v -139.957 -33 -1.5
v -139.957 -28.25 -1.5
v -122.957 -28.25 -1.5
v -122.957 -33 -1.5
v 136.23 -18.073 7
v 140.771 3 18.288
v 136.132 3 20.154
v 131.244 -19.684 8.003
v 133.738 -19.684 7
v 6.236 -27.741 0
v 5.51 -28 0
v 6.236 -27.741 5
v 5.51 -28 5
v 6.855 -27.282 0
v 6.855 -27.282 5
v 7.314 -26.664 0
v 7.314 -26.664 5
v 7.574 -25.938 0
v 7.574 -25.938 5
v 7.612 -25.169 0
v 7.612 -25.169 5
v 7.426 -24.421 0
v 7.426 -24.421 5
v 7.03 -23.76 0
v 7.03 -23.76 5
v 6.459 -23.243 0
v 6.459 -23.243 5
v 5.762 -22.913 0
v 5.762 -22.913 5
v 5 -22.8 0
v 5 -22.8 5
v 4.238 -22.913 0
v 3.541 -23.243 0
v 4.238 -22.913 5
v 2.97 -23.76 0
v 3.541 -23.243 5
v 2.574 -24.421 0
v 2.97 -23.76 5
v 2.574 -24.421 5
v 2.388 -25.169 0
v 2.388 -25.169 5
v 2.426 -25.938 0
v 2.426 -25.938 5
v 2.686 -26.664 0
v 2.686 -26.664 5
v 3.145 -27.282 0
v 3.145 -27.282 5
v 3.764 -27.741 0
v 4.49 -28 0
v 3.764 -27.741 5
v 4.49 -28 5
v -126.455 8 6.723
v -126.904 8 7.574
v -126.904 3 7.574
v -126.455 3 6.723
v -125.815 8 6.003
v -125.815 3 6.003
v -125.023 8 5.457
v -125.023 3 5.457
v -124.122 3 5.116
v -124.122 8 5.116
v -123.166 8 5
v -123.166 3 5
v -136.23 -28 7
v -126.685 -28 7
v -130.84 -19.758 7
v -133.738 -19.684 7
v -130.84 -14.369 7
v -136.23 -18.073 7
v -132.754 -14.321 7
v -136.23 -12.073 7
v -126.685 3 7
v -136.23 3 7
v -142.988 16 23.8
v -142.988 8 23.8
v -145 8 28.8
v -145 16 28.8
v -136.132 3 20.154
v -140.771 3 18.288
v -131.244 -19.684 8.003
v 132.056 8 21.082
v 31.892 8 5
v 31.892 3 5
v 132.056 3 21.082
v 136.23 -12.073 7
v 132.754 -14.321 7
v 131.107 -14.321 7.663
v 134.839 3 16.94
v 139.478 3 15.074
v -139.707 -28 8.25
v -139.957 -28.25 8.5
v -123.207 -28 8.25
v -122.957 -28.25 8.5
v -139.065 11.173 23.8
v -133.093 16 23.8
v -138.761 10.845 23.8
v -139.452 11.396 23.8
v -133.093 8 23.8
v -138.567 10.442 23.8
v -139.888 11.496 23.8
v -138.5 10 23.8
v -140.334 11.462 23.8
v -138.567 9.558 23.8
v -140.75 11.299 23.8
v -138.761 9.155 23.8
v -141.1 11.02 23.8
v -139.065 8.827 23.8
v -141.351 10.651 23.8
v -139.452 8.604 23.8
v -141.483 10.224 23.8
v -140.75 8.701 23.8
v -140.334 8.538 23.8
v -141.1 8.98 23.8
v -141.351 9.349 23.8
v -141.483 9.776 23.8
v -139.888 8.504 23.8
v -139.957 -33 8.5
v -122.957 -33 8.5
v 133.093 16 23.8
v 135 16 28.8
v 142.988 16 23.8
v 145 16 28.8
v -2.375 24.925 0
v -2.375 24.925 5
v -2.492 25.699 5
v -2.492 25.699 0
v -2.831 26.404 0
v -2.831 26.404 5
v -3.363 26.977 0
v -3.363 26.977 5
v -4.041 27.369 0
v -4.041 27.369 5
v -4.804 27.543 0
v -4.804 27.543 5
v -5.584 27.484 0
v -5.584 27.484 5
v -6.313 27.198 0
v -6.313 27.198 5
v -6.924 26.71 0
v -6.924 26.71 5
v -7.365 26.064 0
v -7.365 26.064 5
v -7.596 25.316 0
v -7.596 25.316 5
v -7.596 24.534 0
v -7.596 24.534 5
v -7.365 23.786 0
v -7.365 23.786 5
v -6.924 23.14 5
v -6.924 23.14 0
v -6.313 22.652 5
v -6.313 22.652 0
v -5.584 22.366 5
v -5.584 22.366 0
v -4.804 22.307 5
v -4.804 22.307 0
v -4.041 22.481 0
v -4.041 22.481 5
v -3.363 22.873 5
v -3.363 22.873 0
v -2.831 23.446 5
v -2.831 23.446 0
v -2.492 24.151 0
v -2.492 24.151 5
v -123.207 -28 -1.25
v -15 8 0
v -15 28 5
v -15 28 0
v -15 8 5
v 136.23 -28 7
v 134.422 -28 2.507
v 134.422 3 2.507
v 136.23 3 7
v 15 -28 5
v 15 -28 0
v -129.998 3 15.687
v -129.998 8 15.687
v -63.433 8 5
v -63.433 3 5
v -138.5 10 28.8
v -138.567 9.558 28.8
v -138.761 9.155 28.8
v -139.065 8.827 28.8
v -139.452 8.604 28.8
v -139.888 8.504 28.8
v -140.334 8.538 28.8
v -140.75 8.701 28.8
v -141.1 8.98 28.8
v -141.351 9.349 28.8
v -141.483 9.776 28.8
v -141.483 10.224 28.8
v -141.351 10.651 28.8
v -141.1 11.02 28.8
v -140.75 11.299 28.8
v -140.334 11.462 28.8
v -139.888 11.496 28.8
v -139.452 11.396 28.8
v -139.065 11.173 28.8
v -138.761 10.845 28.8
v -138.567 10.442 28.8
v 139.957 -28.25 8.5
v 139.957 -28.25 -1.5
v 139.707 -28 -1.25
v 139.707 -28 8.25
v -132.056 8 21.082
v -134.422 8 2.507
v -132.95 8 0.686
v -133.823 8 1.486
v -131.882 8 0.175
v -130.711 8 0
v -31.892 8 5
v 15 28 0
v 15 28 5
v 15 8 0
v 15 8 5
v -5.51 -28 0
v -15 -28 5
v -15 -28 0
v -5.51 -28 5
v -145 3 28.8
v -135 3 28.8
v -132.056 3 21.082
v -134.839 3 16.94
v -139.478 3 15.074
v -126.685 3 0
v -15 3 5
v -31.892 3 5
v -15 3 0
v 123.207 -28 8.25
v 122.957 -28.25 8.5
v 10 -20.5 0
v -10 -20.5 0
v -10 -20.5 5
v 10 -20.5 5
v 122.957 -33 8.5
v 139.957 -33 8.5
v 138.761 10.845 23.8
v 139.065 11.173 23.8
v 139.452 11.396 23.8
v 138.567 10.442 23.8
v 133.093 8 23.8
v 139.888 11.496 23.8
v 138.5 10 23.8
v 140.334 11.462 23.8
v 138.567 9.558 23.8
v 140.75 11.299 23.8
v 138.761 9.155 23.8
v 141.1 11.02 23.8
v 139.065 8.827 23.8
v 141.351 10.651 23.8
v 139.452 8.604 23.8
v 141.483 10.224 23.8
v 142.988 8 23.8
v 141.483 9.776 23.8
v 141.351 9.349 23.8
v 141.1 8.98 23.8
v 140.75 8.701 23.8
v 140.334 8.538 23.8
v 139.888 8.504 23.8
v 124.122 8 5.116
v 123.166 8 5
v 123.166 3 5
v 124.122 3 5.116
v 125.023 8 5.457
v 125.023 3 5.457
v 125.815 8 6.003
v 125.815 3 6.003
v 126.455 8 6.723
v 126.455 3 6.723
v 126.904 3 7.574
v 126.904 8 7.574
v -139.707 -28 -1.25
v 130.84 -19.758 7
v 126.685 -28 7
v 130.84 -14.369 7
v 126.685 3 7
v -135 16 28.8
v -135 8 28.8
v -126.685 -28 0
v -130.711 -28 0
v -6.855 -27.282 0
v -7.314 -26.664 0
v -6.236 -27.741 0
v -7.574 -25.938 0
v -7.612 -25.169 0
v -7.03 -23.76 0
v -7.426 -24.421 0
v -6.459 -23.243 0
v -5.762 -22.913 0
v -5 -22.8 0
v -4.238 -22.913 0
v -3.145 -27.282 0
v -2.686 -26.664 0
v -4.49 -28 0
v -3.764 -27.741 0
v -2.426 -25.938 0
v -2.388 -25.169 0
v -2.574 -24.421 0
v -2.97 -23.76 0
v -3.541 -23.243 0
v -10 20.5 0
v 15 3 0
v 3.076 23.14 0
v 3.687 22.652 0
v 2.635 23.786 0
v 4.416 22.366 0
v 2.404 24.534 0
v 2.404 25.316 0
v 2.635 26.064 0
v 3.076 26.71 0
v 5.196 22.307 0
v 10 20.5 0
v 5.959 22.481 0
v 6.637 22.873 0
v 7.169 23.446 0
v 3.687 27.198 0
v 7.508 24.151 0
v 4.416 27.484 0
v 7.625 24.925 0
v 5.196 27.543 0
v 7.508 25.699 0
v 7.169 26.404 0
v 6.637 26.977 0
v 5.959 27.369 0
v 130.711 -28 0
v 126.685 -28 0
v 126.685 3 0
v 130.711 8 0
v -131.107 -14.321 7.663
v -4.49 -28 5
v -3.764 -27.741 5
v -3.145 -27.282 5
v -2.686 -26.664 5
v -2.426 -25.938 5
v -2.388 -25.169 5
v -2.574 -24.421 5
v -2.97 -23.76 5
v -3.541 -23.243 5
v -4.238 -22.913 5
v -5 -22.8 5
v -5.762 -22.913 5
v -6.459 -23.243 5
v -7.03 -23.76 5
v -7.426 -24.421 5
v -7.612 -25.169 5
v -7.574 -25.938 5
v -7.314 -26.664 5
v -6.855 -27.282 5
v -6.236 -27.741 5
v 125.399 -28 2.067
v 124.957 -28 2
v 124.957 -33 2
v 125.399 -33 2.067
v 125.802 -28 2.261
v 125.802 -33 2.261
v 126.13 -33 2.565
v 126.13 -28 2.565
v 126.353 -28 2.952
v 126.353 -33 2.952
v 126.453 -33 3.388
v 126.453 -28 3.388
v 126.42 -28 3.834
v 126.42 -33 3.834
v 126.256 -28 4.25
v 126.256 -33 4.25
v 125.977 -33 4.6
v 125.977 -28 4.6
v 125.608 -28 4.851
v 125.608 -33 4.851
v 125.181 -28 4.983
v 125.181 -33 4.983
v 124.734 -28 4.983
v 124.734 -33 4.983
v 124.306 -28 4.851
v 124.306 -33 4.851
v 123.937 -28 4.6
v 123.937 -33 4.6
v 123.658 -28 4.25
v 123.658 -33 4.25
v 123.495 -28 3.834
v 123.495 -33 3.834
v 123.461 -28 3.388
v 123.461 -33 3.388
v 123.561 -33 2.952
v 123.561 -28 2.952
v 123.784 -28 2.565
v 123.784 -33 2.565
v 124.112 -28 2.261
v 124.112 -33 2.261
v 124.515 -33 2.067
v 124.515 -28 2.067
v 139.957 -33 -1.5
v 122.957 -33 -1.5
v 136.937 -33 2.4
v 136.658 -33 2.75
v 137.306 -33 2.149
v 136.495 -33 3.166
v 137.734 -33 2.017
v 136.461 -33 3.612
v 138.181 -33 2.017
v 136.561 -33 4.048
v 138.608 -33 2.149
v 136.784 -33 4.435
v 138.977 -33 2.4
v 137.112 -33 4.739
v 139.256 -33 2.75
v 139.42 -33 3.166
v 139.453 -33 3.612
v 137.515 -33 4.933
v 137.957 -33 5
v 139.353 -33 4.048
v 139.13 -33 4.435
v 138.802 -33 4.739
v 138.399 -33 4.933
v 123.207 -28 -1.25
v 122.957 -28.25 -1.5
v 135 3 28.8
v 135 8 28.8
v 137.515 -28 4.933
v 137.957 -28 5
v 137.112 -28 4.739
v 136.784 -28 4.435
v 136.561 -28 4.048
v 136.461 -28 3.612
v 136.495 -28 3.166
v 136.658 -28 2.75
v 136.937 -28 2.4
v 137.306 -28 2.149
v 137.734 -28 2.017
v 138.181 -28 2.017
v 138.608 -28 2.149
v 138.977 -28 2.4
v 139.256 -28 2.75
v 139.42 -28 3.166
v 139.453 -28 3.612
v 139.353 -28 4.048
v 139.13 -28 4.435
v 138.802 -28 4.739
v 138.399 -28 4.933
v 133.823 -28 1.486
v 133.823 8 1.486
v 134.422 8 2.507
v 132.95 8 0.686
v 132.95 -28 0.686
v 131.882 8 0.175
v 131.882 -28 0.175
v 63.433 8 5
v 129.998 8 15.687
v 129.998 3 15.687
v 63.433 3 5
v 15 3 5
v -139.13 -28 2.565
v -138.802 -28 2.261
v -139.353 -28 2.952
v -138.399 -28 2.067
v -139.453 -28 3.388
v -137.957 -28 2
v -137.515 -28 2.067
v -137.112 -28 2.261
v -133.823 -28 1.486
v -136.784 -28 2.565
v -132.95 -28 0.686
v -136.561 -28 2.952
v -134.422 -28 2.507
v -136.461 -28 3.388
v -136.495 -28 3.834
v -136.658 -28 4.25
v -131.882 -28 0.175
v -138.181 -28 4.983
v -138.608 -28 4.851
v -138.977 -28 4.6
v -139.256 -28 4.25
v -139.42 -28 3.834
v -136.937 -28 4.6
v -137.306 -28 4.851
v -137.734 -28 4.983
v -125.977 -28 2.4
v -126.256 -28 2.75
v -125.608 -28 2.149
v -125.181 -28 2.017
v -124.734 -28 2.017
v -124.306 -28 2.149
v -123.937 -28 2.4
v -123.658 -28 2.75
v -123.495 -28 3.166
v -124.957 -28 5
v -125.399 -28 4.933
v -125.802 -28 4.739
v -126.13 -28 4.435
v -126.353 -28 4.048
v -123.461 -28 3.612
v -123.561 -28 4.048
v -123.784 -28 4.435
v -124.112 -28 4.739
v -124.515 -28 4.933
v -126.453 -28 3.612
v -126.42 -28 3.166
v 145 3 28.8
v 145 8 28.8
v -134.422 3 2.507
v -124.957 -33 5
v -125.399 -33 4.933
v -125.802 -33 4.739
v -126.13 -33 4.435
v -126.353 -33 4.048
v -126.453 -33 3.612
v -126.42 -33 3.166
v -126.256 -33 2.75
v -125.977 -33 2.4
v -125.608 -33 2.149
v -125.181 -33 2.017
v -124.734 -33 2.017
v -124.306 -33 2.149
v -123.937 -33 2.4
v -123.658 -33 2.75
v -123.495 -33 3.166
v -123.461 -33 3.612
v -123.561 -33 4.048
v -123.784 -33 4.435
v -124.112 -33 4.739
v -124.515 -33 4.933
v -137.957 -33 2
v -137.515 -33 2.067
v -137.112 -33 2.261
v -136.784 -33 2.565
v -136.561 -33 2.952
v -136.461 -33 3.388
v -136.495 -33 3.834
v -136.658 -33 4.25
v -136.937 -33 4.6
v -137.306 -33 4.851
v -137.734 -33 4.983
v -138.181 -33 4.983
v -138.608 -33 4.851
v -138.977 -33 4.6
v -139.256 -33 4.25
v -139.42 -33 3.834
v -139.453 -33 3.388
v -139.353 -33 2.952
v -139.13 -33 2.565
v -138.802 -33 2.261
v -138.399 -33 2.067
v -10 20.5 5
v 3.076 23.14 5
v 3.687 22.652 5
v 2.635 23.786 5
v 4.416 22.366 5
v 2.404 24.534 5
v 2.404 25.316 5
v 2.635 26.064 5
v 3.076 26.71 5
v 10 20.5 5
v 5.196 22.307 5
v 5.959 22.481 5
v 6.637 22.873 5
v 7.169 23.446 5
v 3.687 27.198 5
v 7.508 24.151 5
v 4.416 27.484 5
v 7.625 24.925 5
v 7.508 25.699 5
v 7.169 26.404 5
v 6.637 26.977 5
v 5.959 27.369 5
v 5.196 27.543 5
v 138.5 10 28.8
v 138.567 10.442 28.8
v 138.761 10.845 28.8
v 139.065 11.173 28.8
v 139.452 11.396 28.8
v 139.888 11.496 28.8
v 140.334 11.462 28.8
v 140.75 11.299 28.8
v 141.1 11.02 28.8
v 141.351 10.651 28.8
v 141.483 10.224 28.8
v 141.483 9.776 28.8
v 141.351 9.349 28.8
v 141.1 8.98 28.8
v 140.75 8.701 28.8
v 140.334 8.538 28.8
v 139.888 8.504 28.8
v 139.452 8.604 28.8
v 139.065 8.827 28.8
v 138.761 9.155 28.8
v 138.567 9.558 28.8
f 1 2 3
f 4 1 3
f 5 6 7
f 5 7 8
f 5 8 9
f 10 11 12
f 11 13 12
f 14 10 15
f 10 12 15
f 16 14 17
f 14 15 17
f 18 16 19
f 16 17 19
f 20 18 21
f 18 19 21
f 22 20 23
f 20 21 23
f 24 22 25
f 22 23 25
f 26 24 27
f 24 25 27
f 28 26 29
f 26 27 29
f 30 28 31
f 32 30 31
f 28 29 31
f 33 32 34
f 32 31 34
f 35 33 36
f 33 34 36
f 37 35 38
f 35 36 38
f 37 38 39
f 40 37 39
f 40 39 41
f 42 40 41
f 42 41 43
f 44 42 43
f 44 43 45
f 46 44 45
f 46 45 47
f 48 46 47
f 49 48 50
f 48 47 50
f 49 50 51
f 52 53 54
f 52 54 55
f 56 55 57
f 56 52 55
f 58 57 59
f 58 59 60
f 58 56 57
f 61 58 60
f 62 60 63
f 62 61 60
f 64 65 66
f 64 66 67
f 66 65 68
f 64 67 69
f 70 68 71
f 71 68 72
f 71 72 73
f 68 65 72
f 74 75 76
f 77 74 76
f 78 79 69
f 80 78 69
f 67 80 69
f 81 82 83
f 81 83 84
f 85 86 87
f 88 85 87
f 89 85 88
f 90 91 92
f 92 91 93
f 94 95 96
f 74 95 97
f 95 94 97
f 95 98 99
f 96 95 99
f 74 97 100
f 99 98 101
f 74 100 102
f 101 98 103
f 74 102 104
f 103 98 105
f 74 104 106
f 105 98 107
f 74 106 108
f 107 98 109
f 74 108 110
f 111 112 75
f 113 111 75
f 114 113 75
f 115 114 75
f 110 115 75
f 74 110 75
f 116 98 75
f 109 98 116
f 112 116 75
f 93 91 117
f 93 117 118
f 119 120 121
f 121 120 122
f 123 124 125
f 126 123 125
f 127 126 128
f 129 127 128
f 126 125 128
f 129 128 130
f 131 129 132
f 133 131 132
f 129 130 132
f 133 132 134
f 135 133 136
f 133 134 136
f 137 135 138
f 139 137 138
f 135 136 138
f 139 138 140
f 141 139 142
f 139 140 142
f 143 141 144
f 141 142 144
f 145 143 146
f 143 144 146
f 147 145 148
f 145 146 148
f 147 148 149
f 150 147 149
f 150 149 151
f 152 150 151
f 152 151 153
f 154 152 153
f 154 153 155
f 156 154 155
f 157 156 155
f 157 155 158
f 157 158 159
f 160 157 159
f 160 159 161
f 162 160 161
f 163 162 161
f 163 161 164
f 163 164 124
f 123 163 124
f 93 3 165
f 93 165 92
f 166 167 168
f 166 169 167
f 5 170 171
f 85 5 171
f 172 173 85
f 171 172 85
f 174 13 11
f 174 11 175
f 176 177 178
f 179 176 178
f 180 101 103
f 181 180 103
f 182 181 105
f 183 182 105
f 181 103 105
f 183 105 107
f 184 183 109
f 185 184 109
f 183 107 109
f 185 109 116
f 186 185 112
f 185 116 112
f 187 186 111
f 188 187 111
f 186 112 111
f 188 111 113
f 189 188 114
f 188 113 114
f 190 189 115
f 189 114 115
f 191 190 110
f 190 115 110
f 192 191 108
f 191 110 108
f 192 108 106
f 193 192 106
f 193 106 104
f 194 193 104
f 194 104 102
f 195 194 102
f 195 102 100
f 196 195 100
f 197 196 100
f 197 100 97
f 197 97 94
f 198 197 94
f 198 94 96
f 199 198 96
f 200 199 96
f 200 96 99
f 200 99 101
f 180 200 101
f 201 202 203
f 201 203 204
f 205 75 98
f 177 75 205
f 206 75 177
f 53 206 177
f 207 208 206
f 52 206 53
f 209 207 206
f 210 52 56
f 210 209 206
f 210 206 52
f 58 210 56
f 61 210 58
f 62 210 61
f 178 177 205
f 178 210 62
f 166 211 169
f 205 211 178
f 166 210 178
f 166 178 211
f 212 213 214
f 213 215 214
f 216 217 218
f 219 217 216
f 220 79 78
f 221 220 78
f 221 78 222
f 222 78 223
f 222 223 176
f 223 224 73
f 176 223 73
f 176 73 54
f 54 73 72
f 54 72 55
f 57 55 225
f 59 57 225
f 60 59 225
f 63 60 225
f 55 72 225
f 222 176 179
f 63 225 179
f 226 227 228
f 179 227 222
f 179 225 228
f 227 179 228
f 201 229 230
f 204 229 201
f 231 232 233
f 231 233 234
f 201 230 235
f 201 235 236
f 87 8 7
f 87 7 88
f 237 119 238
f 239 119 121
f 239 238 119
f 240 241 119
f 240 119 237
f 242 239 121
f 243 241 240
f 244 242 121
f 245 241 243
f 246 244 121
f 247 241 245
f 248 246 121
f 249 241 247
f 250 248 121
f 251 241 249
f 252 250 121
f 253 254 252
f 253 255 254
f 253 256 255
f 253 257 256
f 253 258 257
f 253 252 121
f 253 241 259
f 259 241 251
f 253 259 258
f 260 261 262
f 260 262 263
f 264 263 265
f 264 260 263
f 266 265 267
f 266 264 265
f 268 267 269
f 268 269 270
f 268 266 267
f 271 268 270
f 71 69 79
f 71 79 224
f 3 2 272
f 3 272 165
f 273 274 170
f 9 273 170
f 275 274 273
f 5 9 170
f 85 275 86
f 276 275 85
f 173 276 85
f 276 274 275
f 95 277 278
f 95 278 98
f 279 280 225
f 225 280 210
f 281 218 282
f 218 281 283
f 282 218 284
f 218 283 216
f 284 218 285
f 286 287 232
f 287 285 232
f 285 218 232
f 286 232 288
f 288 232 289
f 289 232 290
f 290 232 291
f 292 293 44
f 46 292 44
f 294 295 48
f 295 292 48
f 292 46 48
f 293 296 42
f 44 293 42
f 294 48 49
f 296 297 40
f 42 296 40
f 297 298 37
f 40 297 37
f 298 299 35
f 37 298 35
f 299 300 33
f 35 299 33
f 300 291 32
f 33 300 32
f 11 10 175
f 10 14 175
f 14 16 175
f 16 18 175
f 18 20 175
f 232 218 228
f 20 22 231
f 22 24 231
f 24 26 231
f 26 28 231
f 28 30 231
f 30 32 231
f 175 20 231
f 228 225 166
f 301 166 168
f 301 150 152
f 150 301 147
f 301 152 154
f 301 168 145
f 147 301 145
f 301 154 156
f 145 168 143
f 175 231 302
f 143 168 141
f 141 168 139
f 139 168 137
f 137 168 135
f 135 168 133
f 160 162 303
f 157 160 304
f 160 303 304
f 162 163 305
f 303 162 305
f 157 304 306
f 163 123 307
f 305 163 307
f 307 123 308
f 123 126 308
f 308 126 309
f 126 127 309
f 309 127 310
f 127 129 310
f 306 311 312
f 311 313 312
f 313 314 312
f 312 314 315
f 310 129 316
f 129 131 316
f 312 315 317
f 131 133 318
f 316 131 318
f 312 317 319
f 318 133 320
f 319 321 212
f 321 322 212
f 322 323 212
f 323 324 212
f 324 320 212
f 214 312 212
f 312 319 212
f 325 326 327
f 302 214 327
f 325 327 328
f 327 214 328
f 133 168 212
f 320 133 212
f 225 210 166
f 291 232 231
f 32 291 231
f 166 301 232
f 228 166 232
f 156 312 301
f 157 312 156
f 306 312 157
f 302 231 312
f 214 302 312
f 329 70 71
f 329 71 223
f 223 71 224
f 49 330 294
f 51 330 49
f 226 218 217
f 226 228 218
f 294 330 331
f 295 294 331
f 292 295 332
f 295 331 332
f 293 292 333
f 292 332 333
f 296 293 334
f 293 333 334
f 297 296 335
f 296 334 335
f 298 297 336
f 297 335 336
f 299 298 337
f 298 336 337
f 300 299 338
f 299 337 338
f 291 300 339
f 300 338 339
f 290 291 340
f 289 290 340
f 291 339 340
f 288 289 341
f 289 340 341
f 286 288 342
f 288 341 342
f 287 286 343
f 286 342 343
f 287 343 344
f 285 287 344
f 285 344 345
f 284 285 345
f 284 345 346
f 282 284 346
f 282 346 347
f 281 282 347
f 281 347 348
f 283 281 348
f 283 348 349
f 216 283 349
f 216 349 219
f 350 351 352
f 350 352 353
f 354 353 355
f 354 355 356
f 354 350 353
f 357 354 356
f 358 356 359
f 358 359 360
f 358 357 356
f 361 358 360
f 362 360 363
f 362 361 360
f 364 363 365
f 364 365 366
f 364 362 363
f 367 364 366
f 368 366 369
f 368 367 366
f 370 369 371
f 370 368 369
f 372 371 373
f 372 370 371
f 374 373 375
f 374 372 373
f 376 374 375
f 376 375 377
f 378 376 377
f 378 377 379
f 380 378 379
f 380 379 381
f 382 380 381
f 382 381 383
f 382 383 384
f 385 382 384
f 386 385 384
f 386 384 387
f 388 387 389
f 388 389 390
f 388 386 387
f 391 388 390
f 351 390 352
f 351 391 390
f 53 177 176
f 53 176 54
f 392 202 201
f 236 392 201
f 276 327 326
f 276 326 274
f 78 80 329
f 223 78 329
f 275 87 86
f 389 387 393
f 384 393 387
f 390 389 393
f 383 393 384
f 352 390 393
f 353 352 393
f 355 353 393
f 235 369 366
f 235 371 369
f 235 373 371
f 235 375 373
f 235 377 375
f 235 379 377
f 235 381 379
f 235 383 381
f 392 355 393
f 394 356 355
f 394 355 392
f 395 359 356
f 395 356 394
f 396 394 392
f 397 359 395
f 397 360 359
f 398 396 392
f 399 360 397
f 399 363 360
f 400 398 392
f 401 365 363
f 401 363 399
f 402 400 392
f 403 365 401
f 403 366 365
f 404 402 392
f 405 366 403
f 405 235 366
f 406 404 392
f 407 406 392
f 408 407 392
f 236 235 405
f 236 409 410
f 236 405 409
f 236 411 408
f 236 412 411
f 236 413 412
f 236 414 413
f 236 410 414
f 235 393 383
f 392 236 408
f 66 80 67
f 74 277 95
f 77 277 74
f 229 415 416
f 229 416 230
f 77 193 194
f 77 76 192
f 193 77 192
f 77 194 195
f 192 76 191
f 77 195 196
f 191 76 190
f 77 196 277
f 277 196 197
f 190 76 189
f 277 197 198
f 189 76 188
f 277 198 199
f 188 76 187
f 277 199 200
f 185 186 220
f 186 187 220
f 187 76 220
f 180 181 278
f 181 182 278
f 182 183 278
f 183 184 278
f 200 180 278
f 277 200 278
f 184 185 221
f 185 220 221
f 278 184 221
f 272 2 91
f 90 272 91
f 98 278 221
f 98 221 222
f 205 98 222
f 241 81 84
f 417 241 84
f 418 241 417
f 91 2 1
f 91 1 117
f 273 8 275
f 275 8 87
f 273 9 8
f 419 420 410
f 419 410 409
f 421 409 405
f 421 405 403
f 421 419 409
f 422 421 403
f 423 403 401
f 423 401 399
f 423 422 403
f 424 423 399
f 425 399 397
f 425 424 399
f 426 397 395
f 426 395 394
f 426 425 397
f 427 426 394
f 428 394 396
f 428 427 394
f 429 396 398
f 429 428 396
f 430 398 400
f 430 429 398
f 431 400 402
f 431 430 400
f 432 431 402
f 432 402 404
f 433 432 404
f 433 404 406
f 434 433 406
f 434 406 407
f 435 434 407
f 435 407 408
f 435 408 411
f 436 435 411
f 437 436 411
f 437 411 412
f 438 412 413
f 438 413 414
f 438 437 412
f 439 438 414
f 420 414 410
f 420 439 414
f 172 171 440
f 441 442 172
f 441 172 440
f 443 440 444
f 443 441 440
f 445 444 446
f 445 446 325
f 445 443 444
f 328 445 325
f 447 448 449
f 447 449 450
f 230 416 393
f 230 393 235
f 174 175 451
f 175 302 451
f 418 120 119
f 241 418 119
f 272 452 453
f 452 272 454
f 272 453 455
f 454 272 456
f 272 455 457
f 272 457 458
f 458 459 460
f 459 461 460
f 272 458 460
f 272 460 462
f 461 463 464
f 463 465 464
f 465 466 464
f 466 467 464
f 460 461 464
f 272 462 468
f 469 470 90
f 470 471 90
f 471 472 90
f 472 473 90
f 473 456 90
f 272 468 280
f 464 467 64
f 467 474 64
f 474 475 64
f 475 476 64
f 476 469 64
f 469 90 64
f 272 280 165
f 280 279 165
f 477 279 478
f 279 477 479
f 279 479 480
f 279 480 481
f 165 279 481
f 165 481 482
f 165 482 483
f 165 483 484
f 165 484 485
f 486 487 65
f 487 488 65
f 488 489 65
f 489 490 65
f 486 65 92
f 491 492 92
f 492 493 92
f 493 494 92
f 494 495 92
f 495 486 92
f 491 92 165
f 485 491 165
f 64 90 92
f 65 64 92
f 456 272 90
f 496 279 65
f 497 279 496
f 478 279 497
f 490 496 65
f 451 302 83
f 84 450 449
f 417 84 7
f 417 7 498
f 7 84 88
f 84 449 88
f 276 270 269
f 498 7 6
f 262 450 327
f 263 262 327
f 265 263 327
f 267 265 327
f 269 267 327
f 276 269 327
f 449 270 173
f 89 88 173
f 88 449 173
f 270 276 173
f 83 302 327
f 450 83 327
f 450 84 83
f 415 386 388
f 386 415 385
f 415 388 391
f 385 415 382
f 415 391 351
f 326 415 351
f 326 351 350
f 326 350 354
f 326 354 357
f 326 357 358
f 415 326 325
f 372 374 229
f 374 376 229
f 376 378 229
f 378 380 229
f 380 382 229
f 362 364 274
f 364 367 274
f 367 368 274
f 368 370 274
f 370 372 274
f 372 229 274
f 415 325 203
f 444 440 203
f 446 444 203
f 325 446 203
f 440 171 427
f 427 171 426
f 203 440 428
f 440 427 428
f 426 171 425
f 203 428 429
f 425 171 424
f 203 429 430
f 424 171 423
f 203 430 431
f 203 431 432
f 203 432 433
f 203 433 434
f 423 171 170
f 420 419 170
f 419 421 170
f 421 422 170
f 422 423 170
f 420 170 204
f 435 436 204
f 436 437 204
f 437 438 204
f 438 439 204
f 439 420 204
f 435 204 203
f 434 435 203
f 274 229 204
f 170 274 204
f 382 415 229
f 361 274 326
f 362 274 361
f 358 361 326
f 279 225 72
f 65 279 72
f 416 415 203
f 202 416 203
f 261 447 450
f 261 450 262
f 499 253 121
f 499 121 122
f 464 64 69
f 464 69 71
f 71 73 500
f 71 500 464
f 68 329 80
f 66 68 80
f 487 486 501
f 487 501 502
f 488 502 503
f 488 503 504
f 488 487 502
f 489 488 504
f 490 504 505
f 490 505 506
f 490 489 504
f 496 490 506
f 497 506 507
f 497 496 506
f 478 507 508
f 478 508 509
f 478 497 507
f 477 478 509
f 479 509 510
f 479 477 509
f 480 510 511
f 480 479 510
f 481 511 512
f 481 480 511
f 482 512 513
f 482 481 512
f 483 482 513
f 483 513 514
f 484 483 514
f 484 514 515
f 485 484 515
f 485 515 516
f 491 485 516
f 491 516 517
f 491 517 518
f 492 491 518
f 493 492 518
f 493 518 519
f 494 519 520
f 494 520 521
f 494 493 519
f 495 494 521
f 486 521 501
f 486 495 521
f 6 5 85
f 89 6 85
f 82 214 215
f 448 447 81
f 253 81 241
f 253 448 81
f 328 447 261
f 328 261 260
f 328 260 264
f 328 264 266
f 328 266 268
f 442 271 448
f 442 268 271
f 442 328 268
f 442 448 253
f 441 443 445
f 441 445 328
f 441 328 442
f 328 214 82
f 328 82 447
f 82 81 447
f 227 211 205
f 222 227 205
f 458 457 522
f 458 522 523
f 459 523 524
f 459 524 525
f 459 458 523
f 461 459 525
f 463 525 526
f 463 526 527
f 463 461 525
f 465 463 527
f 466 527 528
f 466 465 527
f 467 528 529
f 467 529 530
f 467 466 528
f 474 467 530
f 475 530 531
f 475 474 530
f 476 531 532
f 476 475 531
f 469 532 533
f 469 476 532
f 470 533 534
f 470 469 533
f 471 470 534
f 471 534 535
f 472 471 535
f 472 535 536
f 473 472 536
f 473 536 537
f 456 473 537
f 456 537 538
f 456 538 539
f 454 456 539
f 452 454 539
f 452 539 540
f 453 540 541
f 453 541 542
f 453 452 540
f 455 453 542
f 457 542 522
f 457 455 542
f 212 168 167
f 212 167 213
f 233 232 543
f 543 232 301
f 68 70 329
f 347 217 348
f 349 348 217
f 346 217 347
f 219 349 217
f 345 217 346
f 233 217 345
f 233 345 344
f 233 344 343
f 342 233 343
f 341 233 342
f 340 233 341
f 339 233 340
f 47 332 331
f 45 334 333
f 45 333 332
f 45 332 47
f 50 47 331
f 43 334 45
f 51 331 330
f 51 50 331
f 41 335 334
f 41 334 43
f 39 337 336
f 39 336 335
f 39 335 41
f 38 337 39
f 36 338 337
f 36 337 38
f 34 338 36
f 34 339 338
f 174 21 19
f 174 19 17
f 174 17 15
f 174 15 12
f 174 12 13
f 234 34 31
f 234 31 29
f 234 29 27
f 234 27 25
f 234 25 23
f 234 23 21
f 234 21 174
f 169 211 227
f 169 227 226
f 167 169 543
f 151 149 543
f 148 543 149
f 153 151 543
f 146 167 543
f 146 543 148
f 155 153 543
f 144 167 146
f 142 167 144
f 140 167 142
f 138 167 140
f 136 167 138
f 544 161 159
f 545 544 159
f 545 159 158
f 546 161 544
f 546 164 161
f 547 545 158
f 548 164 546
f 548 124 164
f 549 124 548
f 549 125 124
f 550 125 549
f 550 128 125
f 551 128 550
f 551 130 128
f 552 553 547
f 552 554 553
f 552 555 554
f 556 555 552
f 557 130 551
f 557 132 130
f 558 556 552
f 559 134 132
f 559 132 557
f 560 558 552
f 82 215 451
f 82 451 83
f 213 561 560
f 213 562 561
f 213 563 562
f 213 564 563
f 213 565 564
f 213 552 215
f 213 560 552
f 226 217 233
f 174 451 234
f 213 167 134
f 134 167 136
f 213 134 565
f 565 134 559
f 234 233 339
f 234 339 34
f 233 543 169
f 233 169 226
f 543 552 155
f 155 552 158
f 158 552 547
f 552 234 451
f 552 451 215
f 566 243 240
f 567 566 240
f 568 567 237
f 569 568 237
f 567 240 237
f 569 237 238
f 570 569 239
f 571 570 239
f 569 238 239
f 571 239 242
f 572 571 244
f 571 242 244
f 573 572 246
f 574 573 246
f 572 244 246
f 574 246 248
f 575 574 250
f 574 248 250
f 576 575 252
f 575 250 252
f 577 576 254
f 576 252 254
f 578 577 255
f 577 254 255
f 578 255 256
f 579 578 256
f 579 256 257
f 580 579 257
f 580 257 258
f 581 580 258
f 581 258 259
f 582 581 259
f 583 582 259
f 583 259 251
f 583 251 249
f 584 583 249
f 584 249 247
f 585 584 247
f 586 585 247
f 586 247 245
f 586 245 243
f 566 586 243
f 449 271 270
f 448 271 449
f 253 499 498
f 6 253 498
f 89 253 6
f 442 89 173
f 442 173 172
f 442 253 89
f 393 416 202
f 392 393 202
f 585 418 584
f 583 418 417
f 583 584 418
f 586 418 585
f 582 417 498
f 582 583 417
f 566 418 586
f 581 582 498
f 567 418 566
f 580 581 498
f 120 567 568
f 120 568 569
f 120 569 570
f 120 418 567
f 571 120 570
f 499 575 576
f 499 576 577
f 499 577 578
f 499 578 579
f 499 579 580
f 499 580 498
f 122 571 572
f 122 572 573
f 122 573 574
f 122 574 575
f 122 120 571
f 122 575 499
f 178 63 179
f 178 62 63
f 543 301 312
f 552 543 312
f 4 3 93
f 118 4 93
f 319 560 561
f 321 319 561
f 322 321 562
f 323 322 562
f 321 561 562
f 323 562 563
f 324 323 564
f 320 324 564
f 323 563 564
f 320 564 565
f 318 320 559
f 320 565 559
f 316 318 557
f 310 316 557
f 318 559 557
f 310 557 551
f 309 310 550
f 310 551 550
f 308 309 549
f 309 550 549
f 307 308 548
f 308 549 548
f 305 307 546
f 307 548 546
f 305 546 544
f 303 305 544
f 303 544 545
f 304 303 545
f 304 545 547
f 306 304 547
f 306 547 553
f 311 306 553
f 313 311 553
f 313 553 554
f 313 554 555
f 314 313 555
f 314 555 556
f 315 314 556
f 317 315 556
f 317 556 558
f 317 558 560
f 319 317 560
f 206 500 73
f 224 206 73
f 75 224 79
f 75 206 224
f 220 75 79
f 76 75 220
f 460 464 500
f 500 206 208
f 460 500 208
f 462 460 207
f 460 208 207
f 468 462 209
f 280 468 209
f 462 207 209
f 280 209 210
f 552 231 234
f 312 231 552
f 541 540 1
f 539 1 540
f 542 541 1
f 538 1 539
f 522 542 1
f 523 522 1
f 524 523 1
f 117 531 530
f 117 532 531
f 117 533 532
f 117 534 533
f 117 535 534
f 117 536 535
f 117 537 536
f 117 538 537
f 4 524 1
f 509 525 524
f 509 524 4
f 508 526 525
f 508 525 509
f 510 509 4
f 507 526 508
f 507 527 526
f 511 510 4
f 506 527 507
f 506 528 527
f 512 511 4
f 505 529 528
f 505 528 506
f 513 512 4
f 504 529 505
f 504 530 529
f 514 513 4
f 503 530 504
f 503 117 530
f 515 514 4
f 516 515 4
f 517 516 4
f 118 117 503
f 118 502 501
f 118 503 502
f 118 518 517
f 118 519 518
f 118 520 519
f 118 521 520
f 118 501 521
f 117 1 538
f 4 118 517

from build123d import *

# Parameters (mm, degrees)
ESQUISSE1_W             = 30
ESQUISSE1_H             = 51
ESQUISSE1_W_2           = 20
ESQUISSE1_H_2           = 41
BOSS_EXTRU_1_DEPTH      = 5
BOSS_EXTRU_3_DEPTH      = 5
BOSS_EXTRU_4_DEPTH      = 8
ESQUISSE5_W             = 30
ESQUISSE5_H             = 5
BOSS_EXTRU_5_DEPTH      = 2.5
ESQUISSE6_W             = 30
ESQUISSE6_H             = 5
BOSS_EXTRU_6_DEPTH      = 2.5
ESQUISSE7_R             = 1.5
ENL_V_MAT_EXTRU_1_DEPTH = 150.584223767
ESQUISSE8_R             = 2.625
ENL_V_MAT_EXTRU_2_DEPTH = 150.584223767
BOSS_EXTRU_8_DEPTH      = 5
BOSS_EXTRU_9_DEPTH      = 31
BOSS_EXTRU_11_DEPTH     = 5
ESQUISSE16_W            = 17
ESQUISSE16_H            = 10
ESQUISSE16_R            = 1.5
BOSS_EXTRU_12_DEPTH     = 5
CHANFREIN3_SIZE         = 0.25
BOSS_EXTRU_13_DEPTH     = 5
BOSS_EXTRU_14_DEPTH     = 5


with BuildPart() as part:
    # Esquisse1 → Boss.-Extru.1 (new body)
    with BuildSketch(Plane.XY):
        Rectangle(ESQUISSE1_W, ESQUISSE1_H)
        Rectangle(ESQUISSE1_W_2, ESQUISSE1_H_2, mode=Mode.SUBTRACT)
    extrude(amount=BOSS_EXTRU_1_DEPTH)

    # Esquisse3 → Boss.-Extru.3 (add)
    with BuildSketch(Plane(origin=(0, 8, 0), x_dir=(1, 0, 0), z_dir=(0, 1, 0))):
        with BuildLine():
            Line((130.711195077, 0), (15, 0))
            Line((15, 0), (15, -5))
            Line((15, -5), (123.166385806, -5))
            ThreePointArc((123.166385806, -5), (125.435495458, -5.705892931), (126.903730879, -7.574429307))
            Line((126.903730879, -7.574429307), (135, -28.8))
            Line((135, -28.8), (145, -28.8))
            Line((145, -28.8), (134.422141223, -2.507057034))
            ThreePointArc((134.422141223, -2.507057034), (132.950416832, -0.685503668), (130.711195077, 0))
        make_face()
        with BuildLine():
            Line((-123.166385806, -5), (-15, -5))
            Line((-15, -5), (-15, 0))
            Line((-15, 0), (-130.711195077, 0))
            ThreePointArc((-130.711195077, 0), (-132.950416832, -0.685503668), (-134.422141223, -2.507057034))
            Line((-134.422141223, -2.507057034), (-145, -28.8))
            Line((-145, -28.8), (-135, -28.8))
            Line((-135, -28.8), (-126.903730879, -7.574429307))
            ThreePointArc((-126.903730879, -7.574429307), (-125.435495458, -5.705892931), (-123.166385806, -5))
        make_face()
    extrude(amount=-BOSS_EXTRU_3_DEPTH)

    # Esquisse4 → Boss.-Extru.4 (add)
    with BuildSketch(Plane(origin=(0, 8, 0), x_dir=(-1, 0, 0), z_dir=(0, 1, 0))):
        Polygon((145, 28.8), (135, 28.8), (133.09280296, 23.8), (142.98846048, 23.8), align=None)
        Polygon((-142.98846048, 23.8), (-145, 28.8), (-135, 28.8), (-133.09280296, 23.8), align=None)
    extrude(amount=BOSS_EXTRU_4_DEPTH)

    # Esquisse5 → Boss.-Extru.5 (add)
    with BuildSketch(Plane(origin=(0, 25.5, 0), x_dir=(1, 0, 0), z_dir=(0, 1, 0))):
        with Locations((0, -2.5)):
            Rectangle(ESQUISSE5_W, ESQUISSE5_H)
    extrude(amount=BOSS_EXTRU_5_DEPTH)

    # Esquisse6 → Boss.-Extru.6 (add)
    with BuildSketch(Plane.XZ.offset(25.5)):
        with Locations((0, 2.5)):
            Rectangle(ESQUISSE6_W, ESQUISSE6_H)
    extrude(amount=BOSS_EXTRU_6_DEPTH)

    # Esquisse7 → Enlèv. mat.-Extru.1 (cut, through all)
    with BuildSketch(Plane(origin=(0, 0, 23.8), x_dir=(-1, 0, 0), z_dir=(0, 0, -1))):
        with Locations((-140, 10)):
            Circle(ESQUISSE7_R)
        with Locations(Location((140, 10, 0), (0, 0, 180))):
            Circle(ESQUISSE7_R)
    extrude(amount=-ENL_V_MAT_EXTRU_1_DEPTH, mode=Mode.SUBTRACT)

    # Esquisse8 → Enlèv. mat.-Extru.2 (cut, through all)
    with BuildSketch(Plane.XY.offset(5)):
        with Locations((-5, 24.925)):
            Circle(ESQUISSE8_R)
        with Locations((5, 24.925)):
            Circle(ESQUISSE8_R)
        with Locations((-5, -25.425)):
            Circle(ESQUISSE8_R)
        with Locations((5, -25.425)):
            Circle(ESQUISSE8_R)
    extrude(amount=-ENL_V_MAT_EXTRU_2_DEPTH, mode=Mode.SUBTRACT)

    # Esquisse12 → Boss.-Extru.8 (add)
    with BuildSketch(Plane(origin=(0, 8, 0), x_dir=(1, 0, 0), z_dir=(0, 1, 0))):
        Polygon((-129.99826692, -15.687214654), (-63.433313414, -5), (-31.892154123, -5), (-132.055900977, -21.081607615), align=None)
        Polygon((132.055900977, -21.081607615), (129.99826692, -15.687214654), (63.433313414, -5), (31.892154123, -5), align=None)
    extrude(amount=-BOSS_EXTRU_8_DEPTH)

    # Esquisse13 → Boss.-Extru.9 (add, through all)
    with BuildSketch(Plane.XZ.offset(-3)):
        with BuildLine():
            Line((-126.684620904, 7), (-136.229687691, 7))
            Line((-136.229687691, 7), (-134.422141223, 2.507057034))
            ThreePointArc((-134.422141223, 2.507057034), (-132.950416832, 0.685503668), (-130.711195077, 0))
            Line((-130.711195077, 0), (-126.684620904, 0))
            Line((-126.684620904, 0), (-126.684620904, 7))
        make_face()
        with BuildLine():
            ThreePointArc((134.422141223, 2.507057034), (132.950416832, 0.685503668), (130.711195077, 0))
            Line((130.711195077, 0), (126.684620904, 0))
            Line((126.684620904, 0), (126.684620904, 7))
            Line((126.684620904, 7), (136.229687691, 7))
            Line((136.229687691, 7), (134.422141223, 2.507057034))
        make_face()
    extrude(amount=BOSS_EXTRU_9_DEPTH)

    # Esquisse15 → Boss.-Extru.11 (add)
    with BuildSketch(Plane(origin=(-114.828371074, 0, -46.196361295), x_dir=(-0.3732357415464263, 0, 0.9277365365405684), z_dir=(-0.9277365365405683, 0, -0.37323574154642625))):
        Polygon((56.042576064, -14.320508076), (66.042576064, 3), (69.506677679, 3), (56.409919429, -19.684250702), align=None)
    boss_extru_11 = extrude(amount=-BOSS_EXTRU_11_DEPTH)

    # Symétrie3: Boss.-Extru.11 across plane
    add(boss_extru_11.mirror(Plane(origin=(0, 0, 0), x_dir=(0, 0, 1), z_dir=(1, 0, 0))))

    # Esquisse16 → Boss.-Extru.12 (add)
    # profile 1 of 2: a face of its own
    with BuildSketch(Plane.XZ.offset(28)):
        with Locations((131.457154298, 3.5)):
            Rectangle(ESQUISSE16_W, ESQUISSE16_H)
        with Locations(Location((124.957154298, 3.5, 0), (0, 0, 270))):
            Circle(ESQUISSE16_R, mode=Mode.SUBTRACT)
        with Locations(Location((137.957154298, 3.5, 0), (0, 0, 90))):
            Circle(ESQUISSE16_R, mode=Mode.SUBTRACT)
    # profile 2 of 2: a face of its own
    with BuildSketch(Plane.XZ.offset(28)):
        with Locations((-131.457154298, 3.5)):
            Rectangle(ESQUISSE16_W, ESQUISSE16_H)
        with Locations(Location((-137.957154298, 3.5, 0), (0, 0, 270))):
            Circle(ESQUISSE16_R, mode=Mode.SUBTRACT)
        with Locations(Location((-124.957154298, 3.5, 0), (0, 0, 90))):
            Circle(ESQUISSE16_R, mode=Mode.SUBTRACT)
    extrude(amount=BOSS_EXTRU_12_DEPTH)

    # Chanfrein3
    chanfrein3_edges = [part.edges().sort_by_distance(p)[0] for p in [
        (139.957154298, -28, 3.5),
        (131.457154298, -28, 8.5),
        (122.957154298, -28, 3.5),
        (131.457154298, -28, -1.5),
        (-122.957154298, -28, 3.5),
        (-131.457154298, -28, 8.5),
        (-139.957154298, -28, 3.5),
        (-131.457154298, -28, -1.5),
    ]]
    chamfer(chanfrein3_edges, length=CHANFREIN3_SIZE)

    # Esquisse17 → Boss.-Extru.13 (add)
    with BuildSketch(Plane(origin=(-20.455095506, 3.753380181, 50.844378892), x_dir=(-0.9280869704105542, -0.02741363174056612, -0.37135302361627764), z_dir=(0.3723634989551998, -0.06832633838021179, -0.9255684394626872))):
        Polygon((119.373285615, -20.220046325), (122.060546569, -20.146178288), (121.000071898, -14.796991142), (119.225556278, -14.845769429), align=None)
    extrude(amount=BOSS_EXTRU_13_DEPTH)

    # Esquisse18 → Boss.-Extru.14 (add)
    with BuildSketch(Plane(origin=(20.455095506, 3.753380181, 50.844378892), x_dir=(-0.9280869704105542, 0.02741363174056612, 0.37135302361627764), z_dir=(-0.3723634989551998, -0.06832633838021179, -0.9255684394626872))):
        Polygon((-119.225556278, -14.845769429), (-121.000071898, -14.796991142), (-122.060546569, -20.146178288), (-119.373285615, -20.220046325), align=None)
    extrude(amount=BOSS_EXTRU_14_DEPTH)


solid = part.part
